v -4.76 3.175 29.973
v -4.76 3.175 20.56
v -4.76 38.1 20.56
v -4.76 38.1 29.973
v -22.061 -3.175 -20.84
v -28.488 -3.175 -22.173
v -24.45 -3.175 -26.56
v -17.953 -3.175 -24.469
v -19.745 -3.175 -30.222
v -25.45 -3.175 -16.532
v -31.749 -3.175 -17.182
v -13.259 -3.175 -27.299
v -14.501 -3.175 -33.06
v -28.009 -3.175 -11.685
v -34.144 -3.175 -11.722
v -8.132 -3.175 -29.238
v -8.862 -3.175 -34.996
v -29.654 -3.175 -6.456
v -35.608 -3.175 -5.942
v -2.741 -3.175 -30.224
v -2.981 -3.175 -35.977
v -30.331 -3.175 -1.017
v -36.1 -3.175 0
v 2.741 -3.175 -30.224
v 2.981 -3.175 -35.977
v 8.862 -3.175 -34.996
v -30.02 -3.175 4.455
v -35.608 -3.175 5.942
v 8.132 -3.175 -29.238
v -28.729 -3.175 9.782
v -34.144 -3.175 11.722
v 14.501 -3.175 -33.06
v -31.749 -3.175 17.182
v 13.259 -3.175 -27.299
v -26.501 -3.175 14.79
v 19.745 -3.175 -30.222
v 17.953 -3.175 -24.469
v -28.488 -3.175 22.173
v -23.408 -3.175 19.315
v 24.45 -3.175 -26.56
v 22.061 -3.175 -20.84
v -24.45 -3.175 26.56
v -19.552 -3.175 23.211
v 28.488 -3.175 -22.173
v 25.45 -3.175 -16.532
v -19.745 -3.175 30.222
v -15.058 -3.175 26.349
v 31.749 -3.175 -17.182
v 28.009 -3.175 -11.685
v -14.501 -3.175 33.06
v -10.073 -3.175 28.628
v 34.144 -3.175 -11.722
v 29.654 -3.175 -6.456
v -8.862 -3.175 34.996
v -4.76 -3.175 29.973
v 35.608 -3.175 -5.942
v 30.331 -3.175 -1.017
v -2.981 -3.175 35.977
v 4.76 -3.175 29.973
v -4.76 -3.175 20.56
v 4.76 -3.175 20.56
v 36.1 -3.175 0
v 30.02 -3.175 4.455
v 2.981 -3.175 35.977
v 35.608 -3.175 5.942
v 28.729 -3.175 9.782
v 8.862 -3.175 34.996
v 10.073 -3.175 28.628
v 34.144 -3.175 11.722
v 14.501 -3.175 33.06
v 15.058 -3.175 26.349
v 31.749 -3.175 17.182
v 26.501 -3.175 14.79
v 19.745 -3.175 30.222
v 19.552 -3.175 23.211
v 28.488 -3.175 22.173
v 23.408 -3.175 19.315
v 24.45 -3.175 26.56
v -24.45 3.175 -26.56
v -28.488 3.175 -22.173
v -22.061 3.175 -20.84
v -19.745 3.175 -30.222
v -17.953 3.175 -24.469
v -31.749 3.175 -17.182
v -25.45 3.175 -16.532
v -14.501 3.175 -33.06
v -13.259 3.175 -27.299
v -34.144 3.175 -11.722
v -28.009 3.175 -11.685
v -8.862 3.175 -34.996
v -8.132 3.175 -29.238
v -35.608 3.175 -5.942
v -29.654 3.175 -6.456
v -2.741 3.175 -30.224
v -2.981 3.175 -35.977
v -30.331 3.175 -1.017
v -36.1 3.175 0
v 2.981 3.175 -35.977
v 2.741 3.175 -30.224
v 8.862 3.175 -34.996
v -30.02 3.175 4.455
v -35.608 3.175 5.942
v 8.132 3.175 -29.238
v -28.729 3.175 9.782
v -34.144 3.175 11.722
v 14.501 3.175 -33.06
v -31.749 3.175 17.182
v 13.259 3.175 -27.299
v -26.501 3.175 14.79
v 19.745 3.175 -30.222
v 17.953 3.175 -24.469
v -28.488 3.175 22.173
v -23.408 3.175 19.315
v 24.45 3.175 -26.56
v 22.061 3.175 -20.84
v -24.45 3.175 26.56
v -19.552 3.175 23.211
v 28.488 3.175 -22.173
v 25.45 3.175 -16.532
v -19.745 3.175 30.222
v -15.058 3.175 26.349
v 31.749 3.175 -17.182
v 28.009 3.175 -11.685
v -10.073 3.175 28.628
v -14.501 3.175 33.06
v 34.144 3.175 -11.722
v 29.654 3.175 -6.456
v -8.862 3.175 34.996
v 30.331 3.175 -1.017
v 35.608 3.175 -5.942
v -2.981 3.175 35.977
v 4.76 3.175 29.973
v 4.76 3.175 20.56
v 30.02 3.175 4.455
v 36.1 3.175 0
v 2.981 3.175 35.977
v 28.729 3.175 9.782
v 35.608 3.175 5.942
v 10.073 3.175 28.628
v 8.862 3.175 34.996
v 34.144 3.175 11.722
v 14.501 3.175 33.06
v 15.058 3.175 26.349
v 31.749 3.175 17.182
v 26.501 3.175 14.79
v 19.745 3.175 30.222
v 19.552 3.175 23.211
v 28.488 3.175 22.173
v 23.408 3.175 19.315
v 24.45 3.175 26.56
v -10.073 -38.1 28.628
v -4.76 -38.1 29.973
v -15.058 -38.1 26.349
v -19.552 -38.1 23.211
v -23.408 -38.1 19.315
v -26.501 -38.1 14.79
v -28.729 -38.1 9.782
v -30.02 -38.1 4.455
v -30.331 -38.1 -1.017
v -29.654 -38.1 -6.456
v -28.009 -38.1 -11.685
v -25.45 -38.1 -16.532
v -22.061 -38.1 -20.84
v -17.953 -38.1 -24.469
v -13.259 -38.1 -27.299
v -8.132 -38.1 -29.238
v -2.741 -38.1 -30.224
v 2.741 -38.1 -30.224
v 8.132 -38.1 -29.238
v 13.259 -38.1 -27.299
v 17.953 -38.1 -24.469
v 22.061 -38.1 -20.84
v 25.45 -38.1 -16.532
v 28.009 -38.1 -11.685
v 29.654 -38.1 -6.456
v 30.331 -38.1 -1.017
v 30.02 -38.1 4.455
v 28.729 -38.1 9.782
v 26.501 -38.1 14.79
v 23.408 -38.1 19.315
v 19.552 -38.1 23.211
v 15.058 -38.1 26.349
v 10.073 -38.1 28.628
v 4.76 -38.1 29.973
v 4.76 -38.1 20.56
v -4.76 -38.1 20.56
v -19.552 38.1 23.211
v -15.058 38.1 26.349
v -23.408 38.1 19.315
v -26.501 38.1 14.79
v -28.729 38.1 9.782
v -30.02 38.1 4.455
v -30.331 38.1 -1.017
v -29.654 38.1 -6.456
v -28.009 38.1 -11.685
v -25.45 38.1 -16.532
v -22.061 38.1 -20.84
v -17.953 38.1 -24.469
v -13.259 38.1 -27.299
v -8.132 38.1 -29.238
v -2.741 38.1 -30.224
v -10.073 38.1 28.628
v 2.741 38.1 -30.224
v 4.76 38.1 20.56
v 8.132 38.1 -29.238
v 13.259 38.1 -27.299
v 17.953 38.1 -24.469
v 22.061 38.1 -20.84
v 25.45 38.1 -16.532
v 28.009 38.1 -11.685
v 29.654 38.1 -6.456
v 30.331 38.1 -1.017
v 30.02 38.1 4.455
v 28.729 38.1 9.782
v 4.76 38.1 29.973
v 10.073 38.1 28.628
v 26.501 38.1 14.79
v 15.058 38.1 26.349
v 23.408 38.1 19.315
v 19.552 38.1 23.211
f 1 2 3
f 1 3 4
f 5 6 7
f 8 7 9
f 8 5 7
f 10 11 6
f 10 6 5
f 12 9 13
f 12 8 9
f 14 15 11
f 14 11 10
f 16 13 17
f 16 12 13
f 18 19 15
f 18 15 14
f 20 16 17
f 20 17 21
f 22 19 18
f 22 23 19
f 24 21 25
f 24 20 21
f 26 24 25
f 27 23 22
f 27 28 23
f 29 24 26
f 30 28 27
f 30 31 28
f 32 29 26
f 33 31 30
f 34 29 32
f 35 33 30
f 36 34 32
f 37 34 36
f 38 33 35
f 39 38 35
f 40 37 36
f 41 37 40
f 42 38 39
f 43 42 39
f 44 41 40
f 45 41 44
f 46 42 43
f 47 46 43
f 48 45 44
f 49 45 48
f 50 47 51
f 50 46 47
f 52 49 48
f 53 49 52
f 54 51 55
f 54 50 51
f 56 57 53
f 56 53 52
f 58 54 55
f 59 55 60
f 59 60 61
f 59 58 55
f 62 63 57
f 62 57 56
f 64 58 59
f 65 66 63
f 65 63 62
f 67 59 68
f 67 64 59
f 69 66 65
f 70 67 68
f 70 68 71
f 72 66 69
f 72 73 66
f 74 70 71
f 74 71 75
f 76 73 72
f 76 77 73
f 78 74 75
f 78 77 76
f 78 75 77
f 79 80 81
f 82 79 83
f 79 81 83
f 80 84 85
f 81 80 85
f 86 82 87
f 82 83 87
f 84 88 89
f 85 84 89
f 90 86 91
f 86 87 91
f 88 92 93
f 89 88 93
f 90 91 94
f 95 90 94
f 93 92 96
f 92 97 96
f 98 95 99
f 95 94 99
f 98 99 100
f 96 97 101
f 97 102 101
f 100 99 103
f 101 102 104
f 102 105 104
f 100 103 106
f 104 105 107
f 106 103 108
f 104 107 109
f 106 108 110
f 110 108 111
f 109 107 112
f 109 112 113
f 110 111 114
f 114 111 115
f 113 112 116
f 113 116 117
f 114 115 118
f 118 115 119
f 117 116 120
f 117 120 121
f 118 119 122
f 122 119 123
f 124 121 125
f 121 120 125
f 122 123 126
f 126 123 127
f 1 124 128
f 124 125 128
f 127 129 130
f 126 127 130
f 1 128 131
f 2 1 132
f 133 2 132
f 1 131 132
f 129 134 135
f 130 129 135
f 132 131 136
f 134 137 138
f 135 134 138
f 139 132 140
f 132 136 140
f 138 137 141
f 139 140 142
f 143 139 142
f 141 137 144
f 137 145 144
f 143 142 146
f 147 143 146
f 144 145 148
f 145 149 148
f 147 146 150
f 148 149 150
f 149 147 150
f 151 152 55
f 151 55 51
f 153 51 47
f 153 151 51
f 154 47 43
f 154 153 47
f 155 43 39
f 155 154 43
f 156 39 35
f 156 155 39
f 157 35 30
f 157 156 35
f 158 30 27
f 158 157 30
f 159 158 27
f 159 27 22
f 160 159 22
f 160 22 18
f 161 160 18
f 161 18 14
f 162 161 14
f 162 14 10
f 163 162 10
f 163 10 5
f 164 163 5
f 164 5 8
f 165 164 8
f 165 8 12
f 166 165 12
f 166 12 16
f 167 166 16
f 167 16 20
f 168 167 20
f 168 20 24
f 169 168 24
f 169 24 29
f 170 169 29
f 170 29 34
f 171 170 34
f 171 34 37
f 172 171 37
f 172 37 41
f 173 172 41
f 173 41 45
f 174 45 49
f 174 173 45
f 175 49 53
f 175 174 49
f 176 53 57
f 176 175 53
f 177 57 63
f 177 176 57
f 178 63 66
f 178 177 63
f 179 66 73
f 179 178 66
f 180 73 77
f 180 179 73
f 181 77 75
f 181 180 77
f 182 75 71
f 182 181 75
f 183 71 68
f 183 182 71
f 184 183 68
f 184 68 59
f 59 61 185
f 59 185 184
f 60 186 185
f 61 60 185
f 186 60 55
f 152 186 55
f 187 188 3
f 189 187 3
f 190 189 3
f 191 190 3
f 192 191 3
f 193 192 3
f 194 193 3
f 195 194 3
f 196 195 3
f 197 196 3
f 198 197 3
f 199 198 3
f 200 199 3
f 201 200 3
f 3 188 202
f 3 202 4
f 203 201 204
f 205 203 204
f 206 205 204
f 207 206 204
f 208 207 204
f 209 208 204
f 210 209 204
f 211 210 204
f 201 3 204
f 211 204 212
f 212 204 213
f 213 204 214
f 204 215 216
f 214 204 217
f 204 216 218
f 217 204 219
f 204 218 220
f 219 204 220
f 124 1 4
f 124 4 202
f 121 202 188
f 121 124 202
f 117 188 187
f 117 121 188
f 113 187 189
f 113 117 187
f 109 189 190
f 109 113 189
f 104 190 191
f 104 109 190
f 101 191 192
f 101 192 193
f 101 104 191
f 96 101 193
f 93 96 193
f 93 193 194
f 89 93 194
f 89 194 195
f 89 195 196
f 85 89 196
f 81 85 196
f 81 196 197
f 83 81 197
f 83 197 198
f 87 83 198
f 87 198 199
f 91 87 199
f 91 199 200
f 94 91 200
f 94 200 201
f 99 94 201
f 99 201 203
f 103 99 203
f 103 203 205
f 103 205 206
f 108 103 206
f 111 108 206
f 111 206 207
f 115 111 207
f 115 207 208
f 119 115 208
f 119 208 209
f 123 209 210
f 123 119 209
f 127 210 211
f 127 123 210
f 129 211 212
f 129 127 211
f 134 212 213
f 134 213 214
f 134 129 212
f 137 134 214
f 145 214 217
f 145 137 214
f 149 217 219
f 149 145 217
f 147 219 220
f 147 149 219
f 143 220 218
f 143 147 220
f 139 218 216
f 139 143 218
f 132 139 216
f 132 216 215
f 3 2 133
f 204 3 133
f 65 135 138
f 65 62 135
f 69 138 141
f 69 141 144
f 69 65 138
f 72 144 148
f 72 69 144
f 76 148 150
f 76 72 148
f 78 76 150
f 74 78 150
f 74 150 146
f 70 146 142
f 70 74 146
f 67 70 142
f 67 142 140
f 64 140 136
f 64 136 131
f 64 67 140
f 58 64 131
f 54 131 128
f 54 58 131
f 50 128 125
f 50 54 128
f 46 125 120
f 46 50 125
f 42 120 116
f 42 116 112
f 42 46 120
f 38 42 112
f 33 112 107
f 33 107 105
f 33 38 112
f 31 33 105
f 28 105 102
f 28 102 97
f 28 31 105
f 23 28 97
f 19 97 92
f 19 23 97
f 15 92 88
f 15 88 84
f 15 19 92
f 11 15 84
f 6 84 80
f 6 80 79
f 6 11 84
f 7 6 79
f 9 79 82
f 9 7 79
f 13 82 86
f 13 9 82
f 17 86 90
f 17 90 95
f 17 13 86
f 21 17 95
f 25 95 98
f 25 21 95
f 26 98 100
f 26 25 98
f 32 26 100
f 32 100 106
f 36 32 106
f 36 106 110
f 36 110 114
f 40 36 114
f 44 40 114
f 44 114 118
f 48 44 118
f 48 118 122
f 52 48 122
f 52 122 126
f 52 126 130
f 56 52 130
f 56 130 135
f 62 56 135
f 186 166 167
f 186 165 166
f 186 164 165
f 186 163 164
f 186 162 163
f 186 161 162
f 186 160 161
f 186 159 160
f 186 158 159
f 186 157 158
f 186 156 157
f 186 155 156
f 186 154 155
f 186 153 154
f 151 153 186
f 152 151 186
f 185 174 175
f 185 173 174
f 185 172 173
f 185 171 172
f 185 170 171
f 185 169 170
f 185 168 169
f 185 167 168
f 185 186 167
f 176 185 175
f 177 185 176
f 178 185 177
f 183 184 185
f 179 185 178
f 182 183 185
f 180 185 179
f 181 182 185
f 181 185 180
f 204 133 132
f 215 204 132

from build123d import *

# Parameters (mm, degrees)
F0_R     = 30.348394
F1_DEPTH = 38.1
F2_W     = 9.519064
F2_H     = 19.576774
F3_DEPTH = 101.6
F4_R     = 36.100393
F5_DEPTH = 3.175


with BuildPart() as f1:
    # F0 (on Front) → F1 (new body, symmetric)
    with BuildSketch(Plane.XZ):
        Circle(F0_R)
    extrude(amount=F1_DEPTH, both=True)

    # F2 (on face) → F3 (cut)
    with BuildSketch(Plane.XZ.offset(38.1)):
        with Locations((0, 30.348394)):
            Rectangle(F2_W, F2_H)
    extrude(amount=-F3_DEPTH, mode=Mode.SUBTRACT)

    # F4 (on Front) → F5 (join, symmetric)
    with BuildSketch(Plane.XZ):
        Circle(F4_R)
    extrude(amount=F5_DEPTH, both=True)


solid = f1.part
